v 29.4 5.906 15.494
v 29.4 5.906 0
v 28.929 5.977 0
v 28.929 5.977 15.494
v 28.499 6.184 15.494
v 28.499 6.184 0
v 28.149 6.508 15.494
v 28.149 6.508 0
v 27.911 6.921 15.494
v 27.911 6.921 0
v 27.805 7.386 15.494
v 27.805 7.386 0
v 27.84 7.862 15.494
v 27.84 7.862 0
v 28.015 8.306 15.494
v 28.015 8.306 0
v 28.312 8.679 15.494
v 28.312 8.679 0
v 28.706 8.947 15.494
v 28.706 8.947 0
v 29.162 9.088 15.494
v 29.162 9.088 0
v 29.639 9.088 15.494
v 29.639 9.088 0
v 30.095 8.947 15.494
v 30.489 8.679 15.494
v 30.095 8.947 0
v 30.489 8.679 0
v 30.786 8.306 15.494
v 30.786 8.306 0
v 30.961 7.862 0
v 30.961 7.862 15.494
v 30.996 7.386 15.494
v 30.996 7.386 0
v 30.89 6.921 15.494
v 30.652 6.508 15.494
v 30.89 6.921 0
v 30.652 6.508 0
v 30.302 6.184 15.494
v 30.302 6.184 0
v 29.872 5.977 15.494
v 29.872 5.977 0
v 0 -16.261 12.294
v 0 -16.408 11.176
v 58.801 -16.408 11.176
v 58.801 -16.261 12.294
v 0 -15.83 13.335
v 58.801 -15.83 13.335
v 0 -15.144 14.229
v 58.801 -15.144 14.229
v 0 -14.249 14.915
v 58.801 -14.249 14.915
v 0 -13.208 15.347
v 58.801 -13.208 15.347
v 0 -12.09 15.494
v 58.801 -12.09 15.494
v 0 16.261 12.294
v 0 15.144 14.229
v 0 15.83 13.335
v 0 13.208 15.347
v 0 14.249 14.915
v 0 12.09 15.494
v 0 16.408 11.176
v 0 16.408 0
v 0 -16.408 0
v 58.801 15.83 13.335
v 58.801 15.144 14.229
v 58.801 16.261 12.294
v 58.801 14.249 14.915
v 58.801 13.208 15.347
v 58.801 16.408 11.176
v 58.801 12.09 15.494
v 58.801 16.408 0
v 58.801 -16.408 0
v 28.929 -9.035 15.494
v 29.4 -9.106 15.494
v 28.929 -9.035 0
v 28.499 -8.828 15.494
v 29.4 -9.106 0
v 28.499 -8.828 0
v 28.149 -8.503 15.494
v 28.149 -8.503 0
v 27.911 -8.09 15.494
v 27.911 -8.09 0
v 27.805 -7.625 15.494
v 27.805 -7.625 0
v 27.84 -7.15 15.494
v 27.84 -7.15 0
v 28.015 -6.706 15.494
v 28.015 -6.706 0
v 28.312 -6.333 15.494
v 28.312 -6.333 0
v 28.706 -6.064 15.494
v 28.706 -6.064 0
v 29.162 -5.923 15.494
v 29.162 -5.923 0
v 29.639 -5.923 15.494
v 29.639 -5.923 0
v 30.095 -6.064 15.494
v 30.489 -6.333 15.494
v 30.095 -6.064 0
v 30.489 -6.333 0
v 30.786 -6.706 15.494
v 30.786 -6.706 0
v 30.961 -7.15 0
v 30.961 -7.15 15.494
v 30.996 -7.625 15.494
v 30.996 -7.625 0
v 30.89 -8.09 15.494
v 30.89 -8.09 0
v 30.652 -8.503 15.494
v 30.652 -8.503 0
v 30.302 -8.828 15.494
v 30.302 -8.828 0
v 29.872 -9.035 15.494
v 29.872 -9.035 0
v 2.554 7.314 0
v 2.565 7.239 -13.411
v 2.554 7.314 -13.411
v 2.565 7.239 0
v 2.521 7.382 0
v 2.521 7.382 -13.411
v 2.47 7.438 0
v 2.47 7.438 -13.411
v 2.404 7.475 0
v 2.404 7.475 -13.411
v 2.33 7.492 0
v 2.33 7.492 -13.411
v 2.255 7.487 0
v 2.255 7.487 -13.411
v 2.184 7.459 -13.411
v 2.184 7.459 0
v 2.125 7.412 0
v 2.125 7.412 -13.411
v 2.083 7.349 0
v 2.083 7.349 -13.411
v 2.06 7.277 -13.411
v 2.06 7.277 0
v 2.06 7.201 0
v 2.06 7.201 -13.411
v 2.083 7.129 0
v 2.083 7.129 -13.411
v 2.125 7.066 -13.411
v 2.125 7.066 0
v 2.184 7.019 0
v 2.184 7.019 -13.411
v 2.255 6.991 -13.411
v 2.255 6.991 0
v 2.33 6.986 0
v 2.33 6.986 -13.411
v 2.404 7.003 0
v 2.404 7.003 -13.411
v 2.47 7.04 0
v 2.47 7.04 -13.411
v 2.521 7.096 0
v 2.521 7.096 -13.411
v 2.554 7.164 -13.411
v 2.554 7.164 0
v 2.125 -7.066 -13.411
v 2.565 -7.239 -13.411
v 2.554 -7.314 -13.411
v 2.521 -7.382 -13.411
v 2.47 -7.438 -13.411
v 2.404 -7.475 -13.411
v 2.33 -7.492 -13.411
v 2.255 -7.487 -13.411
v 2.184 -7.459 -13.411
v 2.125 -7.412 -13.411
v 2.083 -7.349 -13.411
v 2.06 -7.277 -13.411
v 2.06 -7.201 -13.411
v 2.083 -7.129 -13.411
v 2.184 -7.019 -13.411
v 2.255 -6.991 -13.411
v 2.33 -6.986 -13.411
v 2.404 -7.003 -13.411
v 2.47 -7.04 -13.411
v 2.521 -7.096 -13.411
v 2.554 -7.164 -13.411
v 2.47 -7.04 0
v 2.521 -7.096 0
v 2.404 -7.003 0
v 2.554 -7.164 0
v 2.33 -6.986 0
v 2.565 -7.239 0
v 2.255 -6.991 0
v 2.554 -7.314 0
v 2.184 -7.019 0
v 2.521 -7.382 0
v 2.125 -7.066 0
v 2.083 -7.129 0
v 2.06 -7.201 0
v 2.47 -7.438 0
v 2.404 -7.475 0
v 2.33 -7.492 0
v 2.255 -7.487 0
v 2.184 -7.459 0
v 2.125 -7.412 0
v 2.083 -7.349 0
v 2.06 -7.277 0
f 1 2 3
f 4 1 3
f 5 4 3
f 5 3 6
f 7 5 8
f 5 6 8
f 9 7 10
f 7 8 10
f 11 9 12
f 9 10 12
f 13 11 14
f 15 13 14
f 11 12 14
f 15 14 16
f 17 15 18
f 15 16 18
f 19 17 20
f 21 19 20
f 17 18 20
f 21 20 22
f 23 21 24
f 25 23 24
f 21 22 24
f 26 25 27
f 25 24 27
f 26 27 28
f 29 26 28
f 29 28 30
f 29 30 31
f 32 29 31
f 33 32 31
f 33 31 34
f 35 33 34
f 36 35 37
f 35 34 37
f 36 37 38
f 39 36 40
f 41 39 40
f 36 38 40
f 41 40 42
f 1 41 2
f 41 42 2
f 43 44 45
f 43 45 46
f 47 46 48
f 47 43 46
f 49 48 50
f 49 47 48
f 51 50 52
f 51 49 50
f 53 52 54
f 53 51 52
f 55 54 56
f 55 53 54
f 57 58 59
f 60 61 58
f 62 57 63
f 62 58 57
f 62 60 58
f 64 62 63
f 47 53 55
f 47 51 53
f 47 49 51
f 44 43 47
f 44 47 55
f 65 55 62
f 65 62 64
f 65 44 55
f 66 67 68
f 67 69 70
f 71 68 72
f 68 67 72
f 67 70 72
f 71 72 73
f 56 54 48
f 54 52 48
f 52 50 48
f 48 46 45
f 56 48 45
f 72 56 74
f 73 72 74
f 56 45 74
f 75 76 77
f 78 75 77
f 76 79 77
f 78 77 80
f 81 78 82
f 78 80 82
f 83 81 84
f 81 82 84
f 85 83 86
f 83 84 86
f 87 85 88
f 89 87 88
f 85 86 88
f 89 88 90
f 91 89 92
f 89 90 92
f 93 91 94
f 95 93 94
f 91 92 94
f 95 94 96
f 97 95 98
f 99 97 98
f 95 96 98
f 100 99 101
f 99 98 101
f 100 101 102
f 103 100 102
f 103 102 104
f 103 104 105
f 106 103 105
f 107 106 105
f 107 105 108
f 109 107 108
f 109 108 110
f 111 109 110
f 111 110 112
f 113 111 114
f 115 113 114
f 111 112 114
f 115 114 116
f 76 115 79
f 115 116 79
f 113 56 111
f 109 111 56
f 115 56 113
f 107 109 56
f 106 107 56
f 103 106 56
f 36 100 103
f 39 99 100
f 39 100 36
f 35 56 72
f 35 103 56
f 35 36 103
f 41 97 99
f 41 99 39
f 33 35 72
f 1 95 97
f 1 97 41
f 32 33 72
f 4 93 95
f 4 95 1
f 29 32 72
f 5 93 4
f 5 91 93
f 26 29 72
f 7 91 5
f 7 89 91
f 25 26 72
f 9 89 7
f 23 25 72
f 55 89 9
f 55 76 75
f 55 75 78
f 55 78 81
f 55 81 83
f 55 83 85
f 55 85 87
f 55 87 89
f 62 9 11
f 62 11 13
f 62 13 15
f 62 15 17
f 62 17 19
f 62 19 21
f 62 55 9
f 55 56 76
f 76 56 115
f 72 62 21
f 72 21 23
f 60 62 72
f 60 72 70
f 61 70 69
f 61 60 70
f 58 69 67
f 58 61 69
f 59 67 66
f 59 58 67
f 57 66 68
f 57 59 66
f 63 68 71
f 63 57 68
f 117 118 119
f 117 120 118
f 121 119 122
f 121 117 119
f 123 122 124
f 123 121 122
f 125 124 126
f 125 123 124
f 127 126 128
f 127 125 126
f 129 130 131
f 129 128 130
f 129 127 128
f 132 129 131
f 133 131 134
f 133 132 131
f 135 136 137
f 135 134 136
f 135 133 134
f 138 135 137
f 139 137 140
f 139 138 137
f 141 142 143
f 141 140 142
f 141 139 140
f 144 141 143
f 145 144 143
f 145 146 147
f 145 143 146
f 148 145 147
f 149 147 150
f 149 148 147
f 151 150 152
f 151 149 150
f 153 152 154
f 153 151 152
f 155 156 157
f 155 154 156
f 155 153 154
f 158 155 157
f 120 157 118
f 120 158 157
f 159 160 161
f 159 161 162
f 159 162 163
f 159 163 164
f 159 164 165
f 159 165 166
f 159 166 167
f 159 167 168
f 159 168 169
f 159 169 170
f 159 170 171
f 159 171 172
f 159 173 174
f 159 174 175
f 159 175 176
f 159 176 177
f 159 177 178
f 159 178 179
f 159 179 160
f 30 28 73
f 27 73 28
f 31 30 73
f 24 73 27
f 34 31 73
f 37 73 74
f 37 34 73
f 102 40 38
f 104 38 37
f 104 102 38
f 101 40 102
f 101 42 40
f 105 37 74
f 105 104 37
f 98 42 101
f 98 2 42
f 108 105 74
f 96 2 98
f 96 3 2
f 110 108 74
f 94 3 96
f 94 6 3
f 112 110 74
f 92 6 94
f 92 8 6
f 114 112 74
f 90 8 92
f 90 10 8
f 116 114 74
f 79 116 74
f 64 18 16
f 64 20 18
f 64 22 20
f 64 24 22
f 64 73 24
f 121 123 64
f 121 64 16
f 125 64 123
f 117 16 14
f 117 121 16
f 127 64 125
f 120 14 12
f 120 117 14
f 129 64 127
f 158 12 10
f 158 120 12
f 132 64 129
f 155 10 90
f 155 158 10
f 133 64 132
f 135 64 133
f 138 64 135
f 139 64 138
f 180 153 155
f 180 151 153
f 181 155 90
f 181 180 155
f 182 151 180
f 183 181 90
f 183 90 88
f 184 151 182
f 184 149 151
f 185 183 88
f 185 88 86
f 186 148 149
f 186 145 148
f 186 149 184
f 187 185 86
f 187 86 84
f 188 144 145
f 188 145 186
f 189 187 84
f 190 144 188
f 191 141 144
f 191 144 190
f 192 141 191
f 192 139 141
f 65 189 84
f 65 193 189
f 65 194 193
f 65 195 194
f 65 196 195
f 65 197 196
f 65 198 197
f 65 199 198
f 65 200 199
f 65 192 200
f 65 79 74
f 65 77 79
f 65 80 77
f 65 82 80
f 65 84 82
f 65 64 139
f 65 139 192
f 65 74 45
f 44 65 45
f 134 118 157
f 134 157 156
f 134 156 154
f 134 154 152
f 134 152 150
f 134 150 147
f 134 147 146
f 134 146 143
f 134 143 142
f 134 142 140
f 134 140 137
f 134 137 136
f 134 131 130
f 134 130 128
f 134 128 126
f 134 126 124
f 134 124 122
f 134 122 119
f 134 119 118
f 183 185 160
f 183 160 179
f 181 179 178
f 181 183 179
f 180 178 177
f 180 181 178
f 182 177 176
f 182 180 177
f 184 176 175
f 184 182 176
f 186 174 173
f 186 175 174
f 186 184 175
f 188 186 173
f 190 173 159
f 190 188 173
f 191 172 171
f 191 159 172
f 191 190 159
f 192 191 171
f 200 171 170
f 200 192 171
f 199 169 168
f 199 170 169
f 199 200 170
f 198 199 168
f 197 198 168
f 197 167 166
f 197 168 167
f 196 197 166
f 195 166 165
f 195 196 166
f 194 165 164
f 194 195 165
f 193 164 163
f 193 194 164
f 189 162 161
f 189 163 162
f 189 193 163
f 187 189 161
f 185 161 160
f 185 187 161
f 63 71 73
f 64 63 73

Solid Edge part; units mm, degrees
sketch "Sketch1" plane through (0, 0, 0) normal (1, 0, 0) x (0, 1, 0)
  line L0 (-16.4084, 0) -> (-16.4084, 11.176)
  arc A0 (-12.0904, 15.494) -> (-16.4084, 11.176) centre (-12.0904, 11.176) ccw
  line L1 (-12.0904, 15.494) -> (12.0904, 15.494)
  arc A1 (12.0904, 15.494) -> (16.4084, 11.176) centre (12.0904, 11.176) cw
  line L2 (16.4084, 11.176) -> (16.4084, 0)
  line L3 (16.4084, 0) -> (-16.4084, 0)
extrude "Protrusion1" add sketch "Sketch1" along normal blind 58.801
sketch "Sketch2" plane through (29.4005, 0, 0) normal (0, 0, -1) x (1, 0, 0)
  circle A0 centre (-27.0891, -7.239) radius 0.254
  circle A1 centre (-27.0891, 7.239) radius 0.254
  dimension "D1" = 0.508
  dimension "D2" = 14.478
  dimension "D3" = 2.3114
extrude "ExtrudedProtrusion_2" add sketch "Sketch2" along normal blind 13.4112
sketch "Sketch3" plane through (29.4005, 0, 0) normal (0, 0, -1) x (0, -1, 0)
  circle A0 centre (-7.5057, 0) radius 1.6002
  circle A1 centre (7.5057, 0) radius 1.6002
  dimension "D1" = 3.2004
  dimension "D2" = 15.0114
extrude "Cutout1" cut sketch "Sketch3" against normal through all
